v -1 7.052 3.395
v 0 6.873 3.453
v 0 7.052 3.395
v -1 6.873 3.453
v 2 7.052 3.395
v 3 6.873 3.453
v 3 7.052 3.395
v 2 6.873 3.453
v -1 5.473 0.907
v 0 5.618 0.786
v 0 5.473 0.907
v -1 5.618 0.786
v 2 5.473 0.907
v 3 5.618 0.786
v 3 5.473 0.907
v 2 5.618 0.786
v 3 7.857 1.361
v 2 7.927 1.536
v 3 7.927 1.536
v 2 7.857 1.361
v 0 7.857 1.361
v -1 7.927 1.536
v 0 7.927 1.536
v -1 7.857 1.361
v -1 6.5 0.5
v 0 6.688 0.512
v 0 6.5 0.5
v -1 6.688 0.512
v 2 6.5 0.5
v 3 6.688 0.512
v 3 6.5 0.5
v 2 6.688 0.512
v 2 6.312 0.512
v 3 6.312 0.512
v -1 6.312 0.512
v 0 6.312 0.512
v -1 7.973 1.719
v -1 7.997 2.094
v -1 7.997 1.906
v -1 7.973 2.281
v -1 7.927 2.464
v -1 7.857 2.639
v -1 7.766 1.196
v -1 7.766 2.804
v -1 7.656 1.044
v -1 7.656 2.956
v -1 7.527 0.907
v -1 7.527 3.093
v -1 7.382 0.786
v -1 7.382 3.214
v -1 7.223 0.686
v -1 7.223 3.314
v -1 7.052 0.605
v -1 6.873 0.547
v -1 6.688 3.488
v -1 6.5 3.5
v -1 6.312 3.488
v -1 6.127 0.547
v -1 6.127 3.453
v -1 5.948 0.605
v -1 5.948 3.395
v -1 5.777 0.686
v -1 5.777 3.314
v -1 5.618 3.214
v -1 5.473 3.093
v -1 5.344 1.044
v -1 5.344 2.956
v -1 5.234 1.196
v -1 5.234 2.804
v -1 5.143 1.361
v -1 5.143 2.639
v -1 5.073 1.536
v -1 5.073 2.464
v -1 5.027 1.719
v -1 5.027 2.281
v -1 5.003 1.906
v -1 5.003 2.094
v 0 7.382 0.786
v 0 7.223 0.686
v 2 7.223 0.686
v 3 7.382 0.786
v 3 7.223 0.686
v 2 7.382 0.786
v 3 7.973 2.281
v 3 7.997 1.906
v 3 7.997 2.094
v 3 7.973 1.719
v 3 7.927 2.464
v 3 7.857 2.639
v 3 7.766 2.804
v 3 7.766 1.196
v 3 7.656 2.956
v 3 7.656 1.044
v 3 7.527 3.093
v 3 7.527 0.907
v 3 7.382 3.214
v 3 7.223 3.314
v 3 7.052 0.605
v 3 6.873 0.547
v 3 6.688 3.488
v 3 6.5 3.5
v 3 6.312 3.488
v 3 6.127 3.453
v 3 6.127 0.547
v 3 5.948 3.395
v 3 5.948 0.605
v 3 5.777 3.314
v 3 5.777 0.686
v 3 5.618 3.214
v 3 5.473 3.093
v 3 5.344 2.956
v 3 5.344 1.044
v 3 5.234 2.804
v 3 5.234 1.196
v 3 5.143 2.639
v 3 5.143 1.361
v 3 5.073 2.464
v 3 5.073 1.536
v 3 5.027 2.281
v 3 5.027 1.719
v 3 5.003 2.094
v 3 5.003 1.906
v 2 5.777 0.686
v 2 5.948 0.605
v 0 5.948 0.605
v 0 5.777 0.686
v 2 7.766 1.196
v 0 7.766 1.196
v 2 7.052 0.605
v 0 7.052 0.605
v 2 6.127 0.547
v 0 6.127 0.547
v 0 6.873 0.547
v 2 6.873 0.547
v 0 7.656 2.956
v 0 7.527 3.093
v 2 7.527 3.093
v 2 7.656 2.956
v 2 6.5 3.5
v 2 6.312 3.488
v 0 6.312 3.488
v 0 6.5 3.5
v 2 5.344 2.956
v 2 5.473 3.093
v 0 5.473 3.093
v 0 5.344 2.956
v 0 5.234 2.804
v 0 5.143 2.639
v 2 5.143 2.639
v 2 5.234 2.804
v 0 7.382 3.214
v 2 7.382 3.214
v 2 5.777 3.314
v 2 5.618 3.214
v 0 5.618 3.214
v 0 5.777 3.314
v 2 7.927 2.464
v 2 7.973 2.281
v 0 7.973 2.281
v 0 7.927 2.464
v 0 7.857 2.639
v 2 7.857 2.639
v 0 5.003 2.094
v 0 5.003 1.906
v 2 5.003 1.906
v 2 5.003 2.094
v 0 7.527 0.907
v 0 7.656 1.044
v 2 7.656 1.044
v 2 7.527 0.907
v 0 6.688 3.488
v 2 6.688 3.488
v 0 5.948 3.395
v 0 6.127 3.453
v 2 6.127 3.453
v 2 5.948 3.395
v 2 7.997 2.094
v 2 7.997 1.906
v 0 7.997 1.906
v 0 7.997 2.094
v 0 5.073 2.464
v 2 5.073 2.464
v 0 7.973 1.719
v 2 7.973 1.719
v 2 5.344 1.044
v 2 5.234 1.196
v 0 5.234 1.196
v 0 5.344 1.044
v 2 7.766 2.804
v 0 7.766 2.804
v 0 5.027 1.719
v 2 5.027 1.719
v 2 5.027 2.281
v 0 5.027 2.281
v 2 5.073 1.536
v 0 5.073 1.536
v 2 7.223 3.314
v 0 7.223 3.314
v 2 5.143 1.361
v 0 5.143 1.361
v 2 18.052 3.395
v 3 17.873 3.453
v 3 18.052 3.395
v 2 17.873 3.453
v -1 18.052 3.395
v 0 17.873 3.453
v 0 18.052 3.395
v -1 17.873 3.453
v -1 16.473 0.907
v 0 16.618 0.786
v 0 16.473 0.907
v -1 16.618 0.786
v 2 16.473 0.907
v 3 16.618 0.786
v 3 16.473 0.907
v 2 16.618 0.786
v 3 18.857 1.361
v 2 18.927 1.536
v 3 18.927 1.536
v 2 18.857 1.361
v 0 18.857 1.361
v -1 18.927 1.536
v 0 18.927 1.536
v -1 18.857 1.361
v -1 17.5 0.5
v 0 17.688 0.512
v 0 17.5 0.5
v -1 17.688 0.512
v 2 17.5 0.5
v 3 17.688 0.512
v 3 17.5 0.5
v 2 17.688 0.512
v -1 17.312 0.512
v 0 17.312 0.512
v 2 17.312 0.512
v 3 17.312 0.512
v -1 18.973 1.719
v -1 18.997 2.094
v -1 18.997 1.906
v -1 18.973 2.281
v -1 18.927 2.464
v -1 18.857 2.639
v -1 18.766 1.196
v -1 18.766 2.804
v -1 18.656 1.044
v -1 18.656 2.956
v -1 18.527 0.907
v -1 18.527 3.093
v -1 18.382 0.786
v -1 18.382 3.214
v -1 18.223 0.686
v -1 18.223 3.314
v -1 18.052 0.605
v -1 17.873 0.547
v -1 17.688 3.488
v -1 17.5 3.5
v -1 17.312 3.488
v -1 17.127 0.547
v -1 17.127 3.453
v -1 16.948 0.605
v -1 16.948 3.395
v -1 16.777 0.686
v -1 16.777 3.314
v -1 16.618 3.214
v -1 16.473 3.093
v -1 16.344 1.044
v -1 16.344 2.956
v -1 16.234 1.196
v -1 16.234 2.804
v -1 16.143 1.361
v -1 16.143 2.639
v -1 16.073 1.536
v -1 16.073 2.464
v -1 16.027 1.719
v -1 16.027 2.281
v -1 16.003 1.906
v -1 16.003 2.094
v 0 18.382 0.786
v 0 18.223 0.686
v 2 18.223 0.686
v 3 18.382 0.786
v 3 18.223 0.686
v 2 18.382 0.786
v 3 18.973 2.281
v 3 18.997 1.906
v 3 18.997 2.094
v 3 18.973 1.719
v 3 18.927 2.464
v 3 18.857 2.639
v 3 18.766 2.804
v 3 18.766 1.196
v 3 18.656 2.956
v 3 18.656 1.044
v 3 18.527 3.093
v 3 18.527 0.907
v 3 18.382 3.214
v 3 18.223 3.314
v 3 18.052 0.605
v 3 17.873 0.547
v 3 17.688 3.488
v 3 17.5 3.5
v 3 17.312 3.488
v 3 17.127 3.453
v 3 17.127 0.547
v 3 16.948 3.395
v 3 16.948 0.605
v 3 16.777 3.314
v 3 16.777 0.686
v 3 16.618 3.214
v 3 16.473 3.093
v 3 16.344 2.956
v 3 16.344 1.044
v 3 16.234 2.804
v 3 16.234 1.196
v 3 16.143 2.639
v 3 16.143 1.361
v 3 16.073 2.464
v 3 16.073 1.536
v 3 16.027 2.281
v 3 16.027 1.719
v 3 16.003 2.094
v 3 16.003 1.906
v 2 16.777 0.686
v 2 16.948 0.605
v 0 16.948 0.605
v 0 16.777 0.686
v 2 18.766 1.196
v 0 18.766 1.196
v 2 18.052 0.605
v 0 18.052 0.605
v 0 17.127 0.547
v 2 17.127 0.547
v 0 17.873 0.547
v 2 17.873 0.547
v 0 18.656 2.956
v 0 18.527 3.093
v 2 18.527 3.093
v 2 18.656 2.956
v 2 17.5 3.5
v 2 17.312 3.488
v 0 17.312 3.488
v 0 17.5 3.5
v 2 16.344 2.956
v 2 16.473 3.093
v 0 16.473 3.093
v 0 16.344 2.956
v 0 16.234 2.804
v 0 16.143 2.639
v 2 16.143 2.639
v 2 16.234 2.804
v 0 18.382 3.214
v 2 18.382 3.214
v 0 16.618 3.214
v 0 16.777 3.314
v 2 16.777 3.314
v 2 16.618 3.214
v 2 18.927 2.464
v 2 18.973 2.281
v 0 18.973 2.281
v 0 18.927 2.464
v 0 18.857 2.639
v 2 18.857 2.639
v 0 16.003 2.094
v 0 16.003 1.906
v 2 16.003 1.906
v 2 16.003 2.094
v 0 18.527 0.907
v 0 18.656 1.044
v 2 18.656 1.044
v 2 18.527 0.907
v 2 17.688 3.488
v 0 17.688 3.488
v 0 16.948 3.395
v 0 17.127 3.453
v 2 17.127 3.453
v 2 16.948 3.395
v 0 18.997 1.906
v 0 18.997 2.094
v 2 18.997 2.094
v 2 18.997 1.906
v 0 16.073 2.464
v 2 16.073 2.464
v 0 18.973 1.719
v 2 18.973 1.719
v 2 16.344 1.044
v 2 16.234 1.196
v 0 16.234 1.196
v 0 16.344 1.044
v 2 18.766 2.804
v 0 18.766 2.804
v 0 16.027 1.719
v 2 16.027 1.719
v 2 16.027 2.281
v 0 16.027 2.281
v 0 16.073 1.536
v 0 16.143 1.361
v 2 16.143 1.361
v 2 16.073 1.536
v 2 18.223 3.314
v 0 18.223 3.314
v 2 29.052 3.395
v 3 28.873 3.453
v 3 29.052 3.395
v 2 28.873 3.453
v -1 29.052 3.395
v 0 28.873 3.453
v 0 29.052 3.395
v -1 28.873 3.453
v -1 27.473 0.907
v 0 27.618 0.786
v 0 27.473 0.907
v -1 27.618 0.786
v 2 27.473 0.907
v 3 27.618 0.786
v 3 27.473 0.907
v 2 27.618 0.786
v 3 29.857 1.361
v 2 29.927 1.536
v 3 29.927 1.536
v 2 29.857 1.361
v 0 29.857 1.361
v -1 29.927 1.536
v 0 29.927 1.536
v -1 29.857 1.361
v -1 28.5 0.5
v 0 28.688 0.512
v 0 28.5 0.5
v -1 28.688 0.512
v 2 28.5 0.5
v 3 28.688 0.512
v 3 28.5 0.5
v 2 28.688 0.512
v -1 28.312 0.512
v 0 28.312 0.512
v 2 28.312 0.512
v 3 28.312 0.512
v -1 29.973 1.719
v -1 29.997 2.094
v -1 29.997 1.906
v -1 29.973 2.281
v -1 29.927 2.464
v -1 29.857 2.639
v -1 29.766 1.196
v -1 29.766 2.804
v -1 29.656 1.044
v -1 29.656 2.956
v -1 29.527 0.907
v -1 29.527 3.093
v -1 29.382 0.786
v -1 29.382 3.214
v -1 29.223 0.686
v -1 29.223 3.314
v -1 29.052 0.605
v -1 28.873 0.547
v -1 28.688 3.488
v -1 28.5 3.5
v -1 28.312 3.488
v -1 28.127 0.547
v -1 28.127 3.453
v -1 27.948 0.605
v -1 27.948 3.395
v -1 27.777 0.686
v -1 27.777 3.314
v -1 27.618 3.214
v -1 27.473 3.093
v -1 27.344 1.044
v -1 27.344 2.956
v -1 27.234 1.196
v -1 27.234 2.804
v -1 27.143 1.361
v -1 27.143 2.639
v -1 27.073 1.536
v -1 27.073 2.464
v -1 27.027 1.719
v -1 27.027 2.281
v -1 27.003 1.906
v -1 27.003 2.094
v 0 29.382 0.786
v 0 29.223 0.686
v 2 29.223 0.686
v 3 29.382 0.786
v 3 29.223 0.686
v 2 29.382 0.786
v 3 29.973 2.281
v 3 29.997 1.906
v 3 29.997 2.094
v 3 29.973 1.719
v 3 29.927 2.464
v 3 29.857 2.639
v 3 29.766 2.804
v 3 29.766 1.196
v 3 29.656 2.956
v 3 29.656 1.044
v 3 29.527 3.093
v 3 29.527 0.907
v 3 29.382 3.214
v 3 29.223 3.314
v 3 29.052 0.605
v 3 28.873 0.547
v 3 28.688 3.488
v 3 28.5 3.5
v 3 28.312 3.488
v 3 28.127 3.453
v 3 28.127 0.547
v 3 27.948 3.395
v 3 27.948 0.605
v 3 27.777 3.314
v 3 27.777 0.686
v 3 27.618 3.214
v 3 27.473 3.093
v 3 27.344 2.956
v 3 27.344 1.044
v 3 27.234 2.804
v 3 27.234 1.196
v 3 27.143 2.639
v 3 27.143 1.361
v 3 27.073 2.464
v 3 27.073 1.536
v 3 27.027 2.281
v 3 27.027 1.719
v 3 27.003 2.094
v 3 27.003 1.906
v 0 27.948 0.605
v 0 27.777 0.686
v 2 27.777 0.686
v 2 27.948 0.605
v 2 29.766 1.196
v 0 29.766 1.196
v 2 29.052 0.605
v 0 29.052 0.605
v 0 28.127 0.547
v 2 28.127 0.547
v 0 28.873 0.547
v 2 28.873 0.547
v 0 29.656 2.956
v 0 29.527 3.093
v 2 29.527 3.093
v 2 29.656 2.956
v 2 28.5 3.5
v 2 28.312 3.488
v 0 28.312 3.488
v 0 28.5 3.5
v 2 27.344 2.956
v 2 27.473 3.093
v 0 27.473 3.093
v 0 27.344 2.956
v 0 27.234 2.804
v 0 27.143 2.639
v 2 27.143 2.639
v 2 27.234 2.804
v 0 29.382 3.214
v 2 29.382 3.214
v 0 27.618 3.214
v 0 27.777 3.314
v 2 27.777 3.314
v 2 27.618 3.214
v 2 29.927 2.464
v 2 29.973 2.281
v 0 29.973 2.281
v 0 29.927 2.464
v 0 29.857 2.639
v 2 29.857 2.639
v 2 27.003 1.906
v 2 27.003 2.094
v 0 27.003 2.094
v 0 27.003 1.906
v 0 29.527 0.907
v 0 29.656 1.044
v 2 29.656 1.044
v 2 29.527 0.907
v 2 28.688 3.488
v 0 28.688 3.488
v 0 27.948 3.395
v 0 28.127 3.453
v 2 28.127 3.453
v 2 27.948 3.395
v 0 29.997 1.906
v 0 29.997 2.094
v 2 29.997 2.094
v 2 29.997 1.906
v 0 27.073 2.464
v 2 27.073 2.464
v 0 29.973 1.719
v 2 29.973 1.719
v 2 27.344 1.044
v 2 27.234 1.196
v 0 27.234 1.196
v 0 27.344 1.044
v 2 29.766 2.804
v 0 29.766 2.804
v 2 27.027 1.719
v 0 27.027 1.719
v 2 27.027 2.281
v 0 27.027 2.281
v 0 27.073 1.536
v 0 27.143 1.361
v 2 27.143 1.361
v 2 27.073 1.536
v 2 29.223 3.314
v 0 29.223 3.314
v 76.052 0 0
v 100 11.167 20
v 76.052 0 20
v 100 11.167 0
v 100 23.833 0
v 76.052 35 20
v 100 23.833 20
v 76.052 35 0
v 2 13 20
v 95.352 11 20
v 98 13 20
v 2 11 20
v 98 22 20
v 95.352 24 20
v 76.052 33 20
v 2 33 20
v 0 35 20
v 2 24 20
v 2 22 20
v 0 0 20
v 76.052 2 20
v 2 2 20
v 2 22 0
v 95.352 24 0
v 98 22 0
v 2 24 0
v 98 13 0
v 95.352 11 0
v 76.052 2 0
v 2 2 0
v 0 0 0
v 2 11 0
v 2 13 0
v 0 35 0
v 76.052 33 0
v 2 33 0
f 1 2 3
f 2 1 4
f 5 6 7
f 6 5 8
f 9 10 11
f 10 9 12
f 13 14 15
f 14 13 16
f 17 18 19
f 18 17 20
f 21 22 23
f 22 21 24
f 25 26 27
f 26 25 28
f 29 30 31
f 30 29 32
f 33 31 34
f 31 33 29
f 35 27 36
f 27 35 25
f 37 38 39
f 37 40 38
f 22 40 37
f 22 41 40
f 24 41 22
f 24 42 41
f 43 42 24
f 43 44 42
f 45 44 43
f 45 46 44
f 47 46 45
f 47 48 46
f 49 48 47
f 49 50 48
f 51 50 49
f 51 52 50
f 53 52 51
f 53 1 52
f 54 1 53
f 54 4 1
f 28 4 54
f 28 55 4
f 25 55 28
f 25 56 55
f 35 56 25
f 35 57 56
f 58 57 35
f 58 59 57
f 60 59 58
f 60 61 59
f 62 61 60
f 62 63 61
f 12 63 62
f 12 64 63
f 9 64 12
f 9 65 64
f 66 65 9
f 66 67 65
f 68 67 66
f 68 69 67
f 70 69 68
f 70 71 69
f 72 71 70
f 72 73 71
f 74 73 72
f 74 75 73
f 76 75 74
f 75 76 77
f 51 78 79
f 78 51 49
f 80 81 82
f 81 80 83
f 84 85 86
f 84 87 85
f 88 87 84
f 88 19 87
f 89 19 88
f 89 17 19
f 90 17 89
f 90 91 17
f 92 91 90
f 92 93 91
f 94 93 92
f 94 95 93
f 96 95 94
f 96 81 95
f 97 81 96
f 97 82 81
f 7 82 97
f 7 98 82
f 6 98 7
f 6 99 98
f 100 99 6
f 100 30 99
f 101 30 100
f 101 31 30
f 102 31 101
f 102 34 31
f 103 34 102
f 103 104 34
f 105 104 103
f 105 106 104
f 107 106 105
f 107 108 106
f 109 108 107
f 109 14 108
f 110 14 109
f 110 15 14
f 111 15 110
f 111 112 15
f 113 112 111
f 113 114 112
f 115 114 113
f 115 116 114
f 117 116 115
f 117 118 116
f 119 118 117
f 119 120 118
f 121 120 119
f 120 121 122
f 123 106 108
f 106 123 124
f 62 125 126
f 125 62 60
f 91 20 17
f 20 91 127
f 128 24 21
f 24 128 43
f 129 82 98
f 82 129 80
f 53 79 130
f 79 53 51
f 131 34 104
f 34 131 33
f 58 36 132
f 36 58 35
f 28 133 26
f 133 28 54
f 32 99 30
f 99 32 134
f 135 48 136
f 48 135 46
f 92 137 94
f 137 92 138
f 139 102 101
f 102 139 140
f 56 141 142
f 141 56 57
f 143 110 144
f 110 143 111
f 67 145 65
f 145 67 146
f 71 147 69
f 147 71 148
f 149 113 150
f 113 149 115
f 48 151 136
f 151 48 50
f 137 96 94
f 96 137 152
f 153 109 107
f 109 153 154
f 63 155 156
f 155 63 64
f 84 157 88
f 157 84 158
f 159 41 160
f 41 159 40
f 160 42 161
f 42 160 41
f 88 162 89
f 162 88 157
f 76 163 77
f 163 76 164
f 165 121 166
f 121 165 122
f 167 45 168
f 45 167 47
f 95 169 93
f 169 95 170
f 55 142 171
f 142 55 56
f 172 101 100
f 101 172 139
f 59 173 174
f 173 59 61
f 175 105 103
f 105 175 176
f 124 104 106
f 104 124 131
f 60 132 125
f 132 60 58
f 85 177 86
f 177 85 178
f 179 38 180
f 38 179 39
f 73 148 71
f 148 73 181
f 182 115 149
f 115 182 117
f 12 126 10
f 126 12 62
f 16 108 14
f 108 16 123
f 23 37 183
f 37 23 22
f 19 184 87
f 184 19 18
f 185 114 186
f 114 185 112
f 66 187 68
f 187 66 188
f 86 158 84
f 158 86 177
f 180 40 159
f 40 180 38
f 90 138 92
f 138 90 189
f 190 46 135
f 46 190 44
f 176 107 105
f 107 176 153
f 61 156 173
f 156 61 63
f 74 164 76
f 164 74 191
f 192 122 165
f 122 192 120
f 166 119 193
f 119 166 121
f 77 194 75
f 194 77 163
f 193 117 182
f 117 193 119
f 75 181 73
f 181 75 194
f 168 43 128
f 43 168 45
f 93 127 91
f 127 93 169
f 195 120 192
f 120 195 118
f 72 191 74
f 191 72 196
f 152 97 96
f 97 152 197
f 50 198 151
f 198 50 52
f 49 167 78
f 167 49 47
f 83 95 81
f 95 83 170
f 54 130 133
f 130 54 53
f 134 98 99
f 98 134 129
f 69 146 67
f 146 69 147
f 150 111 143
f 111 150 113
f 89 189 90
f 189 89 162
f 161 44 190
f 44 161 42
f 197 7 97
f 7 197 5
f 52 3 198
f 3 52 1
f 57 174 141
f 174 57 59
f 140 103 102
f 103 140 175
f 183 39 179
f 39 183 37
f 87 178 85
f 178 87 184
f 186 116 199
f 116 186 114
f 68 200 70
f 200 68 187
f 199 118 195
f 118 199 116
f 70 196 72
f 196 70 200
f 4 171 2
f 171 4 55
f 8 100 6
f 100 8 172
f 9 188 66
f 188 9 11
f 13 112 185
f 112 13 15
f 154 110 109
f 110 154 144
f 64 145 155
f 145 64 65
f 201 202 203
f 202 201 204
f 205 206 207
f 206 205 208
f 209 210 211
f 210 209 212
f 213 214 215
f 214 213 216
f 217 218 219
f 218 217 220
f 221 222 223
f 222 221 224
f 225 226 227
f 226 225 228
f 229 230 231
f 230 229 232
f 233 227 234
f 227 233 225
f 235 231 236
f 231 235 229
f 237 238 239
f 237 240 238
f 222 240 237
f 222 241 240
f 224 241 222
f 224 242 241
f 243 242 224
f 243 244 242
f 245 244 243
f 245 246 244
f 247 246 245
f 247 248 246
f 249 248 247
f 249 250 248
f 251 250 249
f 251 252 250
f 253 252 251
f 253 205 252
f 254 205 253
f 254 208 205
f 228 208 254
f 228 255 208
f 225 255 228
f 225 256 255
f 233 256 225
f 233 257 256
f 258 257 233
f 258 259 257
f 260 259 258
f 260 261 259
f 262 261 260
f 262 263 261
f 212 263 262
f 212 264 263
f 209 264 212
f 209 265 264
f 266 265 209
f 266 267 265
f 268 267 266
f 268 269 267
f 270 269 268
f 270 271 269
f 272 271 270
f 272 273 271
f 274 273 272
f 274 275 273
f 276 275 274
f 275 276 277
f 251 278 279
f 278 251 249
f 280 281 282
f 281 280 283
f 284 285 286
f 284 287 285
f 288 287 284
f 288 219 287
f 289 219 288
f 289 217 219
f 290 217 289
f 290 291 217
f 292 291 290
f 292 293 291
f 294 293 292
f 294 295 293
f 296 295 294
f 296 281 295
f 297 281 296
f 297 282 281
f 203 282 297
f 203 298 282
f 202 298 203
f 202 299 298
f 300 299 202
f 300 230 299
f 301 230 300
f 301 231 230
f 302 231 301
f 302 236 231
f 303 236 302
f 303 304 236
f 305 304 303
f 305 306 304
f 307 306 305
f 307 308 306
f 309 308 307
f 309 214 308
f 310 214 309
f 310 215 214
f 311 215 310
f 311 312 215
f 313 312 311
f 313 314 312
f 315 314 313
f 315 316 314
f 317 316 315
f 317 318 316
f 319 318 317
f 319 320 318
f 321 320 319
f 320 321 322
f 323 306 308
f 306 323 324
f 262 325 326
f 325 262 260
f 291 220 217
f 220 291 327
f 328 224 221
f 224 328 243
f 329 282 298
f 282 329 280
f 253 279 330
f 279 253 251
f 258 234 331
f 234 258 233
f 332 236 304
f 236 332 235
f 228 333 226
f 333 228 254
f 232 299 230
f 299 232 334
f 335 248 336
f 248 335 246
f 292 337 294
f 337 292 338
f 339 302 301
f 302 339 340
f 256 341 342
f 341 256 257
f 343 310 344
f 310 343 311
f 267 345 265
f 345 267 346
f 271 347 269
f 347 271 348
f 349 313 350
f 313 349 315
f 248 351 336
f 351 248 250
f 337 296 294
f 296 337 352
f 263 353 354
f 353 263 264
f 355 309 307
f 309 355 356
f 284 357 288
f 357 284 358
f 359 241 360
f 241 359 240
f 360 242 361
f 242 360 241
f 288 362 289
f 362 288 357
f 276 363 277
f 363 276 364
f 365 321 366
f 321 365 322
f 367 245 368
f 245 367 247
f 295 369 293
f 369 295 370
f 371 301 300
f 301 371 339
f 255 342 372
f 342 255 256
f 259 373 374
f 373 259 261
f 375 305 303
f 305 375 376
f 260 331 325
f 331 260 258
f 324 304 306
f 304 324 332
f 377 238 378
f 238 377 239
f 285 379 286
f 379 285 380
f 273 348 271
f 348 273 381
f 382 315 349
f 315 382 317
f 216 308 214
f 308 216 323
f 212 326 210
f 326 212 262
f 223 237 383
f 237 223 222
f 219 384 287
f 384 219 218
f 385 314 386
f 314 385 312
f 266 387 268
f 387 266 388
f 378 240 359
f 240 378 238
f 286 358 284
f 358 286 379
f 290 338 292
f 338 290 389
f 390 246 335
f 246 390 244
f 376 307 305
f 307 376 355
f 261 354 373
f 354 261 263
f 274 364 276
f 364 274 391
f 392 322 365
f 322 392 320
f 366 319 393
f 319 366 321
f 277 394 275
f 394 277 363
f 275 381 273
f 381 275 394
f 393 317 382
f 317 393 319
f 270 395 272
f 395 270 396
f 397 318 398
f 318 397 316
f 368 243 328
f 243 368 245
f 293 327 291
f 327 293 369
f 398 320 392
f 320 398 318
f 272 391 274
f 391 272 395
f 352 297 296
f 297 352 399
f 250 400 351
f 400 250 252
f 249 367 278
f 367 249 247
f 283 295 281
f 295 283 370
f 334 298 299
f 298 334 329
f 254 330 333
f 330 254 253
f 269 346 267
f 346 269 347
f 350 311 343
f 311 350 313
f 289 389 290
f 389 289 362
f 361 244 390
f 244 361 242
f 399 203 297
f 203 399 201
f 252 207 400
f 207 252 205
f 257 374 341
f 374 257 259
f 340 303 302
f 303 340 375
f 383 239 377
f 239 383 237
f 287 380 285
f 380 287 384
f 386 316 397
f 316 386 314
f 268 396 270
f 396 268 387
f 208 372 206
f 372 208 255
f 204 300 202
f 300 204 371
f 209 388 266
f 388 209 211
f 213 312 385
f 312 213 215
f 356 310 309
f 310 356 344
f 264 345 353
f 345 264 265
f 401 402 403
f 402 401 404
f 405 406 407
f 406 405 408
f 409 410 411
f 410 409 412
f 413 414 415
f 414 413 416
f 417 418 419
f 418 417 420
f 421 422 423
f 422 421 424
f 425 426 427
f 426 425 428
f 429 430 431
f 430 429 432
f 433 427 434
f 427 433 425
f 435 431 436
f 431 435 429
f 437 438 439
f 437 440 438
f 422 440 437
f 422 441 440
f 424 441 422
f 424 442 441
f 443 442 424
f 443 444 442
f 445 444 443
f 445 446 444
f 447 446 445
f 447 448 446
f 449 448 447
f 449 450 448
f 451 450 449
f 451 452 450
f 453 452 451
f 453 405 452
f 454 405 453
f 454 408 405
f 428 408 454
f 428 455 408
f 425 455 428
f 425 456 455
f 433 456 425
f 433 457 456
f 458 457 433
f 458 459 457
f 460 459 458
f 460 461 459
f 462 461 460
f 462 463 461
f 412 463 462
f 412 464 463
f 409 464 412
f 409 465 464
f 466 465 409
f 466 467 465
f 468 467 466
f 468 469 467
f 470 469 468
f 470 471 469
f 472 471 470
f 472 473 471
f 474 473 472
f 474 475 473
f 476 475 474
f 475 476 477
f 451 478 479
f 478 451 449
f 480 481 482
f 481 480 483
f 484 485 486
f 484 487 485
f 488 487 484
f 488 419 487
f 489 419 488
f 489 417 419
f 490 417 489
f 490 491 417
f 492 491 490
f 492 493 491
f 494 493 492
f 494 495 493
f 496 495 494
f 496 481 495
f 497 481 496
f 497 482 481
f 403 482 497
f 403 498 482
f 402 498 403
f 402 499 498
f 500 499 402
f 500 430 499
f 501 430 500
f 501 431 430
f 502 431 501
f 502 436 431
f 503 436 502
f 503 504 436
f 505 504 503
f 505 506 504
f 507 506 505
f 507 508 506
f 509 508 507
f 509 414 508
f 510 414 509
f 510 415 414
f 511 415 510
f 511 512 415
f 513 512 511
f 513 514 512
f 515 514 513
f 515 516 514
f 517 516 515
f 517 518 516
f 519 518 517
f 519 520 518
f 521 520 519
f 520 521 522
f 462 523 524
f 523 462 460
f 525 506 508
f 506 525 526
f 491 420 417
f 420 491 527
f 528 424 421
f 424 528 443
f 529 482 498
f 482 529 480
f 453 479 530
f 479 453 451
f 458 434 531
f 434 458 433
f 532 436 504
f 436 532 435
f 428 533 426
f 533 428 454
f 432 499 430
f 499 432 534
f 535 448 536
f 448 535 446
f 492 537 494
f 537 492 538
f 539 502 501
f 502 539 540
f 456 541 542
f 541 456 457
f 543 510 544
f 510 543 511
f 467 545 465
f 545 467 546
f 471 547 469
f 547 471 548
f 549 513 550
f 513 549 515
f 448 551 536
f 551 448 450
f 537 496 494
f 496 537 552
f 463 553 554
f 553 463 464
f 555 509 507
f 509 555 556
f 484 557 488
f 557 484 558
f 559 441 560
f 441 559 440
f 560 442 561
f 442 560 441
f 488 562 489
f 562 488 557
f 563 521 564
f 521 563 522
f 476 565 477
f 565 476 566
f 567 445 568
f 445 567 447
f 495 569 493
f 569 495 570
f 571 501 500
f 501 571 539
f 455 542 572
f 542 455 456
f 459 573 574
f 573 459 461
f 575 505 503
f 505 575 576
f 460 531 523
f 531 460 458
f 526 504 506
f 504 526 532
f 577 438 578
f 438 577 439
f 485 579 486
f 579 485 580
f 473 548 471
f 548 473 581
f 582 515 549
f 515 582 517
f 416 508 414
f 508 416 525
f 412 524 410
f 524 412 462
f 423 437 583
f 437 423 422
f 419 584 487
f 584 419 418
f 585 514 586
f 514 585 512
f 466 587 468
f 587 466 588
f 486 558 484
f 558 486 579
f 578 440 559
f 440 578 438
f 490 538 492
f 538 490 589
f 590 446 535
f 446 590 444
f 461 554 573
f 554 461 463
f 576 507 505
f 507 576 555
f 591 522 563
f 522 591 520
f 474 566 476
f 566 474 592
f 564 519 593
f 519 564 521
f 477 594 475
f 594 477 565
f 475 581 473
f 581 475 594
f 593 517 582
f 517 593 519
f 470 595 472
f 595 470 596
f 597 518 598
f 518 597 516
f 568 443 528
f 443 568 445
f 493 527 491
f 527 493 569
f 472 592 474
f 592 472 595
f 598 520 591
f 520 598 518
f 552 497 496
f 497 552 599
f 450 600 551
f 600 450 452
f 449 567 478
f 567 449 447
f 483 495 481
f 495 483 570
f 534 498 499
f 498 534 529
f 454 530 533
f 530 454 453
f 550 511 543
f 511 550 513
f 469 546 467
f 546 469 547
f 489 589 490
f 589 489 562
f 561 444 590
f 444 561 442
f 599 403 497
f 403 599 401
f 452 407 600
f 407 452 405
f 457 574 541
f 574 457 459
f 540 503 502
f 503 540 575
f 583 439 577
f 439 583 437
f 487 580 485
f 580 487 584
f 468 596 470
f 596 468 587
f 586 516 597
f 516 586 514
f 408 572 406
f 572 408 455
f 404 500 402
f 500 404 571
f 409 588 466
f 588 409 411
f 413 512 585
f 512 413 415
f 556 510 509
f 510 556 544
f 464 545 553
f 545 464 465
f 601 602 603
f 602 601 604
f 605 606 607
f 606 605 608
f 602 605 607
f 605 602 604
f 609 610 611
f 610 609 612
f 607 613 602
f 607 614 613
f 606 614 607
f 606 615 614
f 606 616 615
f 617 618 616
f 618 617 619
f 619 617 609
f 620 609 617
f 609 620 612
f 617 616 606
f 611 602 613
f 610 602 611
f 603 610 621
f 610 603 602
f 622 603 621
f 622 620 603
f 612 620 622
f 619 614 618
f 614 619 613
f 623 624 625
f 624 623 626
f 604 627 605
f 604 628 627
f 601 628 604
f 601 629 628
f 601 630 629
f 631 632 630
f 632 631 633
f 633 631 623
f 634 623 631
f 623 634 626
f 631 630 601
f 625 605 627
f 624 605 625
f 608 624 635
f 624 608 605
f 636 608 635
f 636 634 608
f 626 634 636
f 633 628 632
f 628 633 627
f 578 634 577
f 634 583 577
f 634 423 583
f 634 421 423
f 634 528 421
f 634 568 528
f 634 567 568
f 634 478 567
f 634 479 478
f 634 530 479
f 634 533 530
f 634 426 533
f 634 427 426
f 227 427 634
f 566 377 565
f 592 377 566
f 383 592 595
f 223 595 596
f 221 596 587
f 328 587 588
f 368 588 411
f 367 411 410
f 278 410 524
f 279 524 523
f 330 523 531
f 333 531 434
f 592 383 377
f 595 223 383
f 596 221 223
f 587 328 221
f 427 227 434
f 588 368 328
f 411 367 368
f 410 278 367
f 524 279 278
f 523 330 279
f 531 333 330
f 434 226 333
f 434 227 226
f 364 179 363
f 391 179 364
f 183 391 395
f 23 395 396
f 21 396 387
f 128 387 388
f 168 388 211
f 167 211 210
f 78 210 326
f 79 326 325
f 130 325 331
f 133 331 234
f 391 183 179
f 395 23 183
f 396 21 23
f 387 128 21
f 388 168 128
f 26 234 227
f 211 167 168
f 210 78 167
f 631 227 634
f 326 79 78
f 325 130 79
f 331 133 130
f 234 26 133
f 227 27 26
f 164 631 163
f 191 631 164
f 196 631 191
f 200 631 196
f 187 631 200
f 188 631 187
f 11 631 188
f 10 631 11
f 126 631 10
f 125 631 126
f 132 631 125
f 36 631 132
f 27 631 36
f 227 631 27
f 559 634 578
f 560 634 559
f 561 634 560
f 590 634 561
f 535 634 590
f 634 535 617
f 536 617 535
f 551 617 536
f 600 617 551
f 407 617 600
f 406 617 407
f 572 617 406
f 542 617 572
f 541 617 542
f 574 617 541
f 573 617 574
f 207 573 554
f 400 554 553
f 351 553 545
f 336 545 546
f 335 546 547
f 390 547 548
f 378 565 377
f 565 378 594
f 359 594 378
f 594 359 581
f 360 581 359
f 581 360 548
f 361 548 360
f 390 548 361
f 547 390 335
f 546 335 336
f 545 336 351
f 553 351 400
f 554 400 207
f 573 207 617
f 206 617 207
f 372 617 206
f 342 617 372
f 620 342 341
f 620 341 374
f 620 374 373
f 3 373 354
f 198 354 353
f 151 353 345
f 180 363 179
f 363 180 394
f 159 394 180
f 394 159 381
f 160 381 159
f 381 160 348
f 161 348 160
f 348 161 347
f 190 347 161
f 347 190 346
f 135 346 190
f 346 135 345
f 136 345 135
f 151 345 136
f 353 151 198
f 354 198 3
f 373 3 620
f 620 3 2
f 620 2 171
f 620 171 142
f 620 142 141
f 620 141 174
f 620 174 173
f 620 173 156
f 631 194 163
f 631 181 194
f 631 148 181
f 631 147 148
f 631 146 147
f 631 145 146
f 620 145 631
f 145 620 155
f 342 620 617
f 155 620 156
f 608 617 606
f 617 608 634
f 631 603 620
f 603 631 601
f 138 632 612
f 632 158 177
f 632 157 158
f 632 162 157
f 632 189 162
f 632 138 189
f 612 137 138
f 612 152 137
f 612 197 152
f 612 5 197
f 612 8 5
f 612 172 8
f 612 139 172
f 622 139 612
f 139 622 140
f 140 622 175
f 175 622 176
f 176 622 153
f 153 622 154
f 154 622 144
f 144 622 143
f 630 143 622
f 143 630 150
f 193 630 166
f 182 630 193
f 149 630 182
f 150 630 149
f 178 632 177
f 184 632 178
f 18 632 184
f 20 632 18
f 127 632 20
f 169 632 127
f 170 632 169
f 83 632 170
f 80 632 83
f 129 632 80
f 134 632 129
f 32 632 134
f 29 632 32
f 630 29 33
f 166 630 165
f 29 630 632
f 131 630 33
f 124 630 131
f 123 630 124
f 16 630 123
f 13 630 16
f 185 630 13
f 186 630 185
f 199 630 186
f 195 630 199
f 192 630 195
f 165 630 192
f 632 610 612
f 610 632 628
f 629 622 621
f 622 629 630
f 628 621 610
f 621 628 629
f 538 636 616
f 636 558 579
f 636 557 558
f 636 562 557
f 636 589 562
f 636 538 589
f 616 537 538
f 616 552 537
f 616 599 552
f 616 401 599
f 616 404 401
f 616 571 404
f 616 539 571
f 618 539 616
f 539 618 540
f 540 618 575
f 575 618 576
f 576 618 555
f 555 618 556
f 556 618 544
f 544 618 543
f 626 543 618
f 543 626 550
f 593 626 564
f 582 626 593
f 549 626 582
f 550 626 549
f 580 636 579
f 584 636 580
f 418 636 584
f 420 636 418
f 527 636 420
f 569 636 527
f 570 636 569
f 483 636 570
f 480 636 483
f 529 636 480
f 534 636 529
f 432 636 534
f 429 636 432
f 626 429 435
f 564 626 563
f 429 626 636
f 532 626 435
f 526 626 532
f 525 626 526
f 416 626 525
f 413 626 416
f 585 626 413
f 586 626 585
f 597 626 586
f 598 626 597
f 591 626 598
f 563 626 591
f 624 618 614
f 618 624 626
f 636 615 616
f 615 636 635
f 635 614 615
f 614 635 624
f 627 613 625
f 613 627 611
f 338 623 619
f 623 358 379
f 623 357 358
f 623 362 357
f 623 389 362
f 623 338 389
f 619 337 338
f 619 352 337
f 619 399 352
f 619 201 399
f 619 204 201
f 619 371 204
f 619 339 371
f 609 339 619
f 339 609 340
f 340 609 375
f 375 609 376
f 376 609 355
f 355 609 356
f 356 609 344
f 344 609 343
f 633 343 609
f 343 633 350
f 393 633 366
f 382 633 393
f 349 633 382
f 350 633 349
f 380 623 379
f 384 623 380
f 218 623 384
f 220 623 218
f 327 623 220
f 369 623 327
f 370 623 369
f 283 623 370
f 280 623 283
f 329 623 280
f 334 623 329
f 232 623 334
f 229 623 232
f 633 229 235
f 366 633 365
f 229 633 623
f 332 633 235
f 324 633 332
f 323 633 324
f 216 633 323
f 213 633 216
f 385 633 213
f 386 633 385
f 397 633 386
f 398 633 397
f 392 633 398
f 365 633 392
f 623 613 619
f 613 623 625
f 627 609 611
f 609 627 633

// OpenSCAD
//Total Shape
height=20;
width=35;
length=100;

//Wall Thickness
thickness=2;

ductWidths = width - (thickness*4);
ductWidth=ductWidths/3;

ductHeightBottom = -1;
ductHeightTop = height + 2;

//M3
holeSize = 3;

//Front Corners
angle = 25;
subLength = length/3;
subWidth = width * (2/3);
$fn=50;

color("red") mountHoles();

difference() {
	box();
	ductMiddle();
	sideDucts();
	mountHoles();
}


module box(){
	difference() {
		cube([length, width, height]);
		subBoxes();
	}
}

module subBoxes() {
	subBox(0);
	translate([ 0, width, 0 ]) mirror([0,1,0]) subBox(0);
}

module subBox(ductWidth) {
	translate([length - sin(angle)*subLength, -cos(angle)*subWidth + ductWidth, -1]) 
	rotate(a=[0, 0, angle])  
	cube([ subLength +1, subWidth , ductHeightTop]);
}

module ductMiddle(){
		translate([thickness, ductWidth + thickness * 2 ,-1]) 
		cube([length - (2*thickness), ductWidth, ductHeightTop]);
}

module sideDucts(){
	sideDuct();
	translate([0, ductWidth * 3 + thickness * 4, 0]) 
		mirror([0,1,0])
		sideDuct();
}

module sideDuct(){
	ductLength = length - (2*thickness);
	
	difference() {
		translate([thickness, thickness, -1]) 
			cube([ductLength, ductWidth, ductHeightTop]);
		subBox(thickness);
	}
}

module mountHoles() {
	translate([ -1, thickness + (ductWidth/2) ,thickness]) mountHole();
	translate([ -1, thickness * 2 + ductWidth/2 + ductWidth ,thickness]) mountHole();
	translate([ -1, thickness * 3 + ductWidth/2 + ductWidth * 2 ,thickness]) mountHole();
	
	translate([ -1, thickness * 2 + ductWidth/2 + ductWidth ,thickness]) mountHole();
}

module mountHole() {
	subtractThickness= thickness +2;
	echo(holeSize);
	rotate(a=90, v=[0,1,0]) cylinder(r=holeSize/2, h=subtractThickness );
}
